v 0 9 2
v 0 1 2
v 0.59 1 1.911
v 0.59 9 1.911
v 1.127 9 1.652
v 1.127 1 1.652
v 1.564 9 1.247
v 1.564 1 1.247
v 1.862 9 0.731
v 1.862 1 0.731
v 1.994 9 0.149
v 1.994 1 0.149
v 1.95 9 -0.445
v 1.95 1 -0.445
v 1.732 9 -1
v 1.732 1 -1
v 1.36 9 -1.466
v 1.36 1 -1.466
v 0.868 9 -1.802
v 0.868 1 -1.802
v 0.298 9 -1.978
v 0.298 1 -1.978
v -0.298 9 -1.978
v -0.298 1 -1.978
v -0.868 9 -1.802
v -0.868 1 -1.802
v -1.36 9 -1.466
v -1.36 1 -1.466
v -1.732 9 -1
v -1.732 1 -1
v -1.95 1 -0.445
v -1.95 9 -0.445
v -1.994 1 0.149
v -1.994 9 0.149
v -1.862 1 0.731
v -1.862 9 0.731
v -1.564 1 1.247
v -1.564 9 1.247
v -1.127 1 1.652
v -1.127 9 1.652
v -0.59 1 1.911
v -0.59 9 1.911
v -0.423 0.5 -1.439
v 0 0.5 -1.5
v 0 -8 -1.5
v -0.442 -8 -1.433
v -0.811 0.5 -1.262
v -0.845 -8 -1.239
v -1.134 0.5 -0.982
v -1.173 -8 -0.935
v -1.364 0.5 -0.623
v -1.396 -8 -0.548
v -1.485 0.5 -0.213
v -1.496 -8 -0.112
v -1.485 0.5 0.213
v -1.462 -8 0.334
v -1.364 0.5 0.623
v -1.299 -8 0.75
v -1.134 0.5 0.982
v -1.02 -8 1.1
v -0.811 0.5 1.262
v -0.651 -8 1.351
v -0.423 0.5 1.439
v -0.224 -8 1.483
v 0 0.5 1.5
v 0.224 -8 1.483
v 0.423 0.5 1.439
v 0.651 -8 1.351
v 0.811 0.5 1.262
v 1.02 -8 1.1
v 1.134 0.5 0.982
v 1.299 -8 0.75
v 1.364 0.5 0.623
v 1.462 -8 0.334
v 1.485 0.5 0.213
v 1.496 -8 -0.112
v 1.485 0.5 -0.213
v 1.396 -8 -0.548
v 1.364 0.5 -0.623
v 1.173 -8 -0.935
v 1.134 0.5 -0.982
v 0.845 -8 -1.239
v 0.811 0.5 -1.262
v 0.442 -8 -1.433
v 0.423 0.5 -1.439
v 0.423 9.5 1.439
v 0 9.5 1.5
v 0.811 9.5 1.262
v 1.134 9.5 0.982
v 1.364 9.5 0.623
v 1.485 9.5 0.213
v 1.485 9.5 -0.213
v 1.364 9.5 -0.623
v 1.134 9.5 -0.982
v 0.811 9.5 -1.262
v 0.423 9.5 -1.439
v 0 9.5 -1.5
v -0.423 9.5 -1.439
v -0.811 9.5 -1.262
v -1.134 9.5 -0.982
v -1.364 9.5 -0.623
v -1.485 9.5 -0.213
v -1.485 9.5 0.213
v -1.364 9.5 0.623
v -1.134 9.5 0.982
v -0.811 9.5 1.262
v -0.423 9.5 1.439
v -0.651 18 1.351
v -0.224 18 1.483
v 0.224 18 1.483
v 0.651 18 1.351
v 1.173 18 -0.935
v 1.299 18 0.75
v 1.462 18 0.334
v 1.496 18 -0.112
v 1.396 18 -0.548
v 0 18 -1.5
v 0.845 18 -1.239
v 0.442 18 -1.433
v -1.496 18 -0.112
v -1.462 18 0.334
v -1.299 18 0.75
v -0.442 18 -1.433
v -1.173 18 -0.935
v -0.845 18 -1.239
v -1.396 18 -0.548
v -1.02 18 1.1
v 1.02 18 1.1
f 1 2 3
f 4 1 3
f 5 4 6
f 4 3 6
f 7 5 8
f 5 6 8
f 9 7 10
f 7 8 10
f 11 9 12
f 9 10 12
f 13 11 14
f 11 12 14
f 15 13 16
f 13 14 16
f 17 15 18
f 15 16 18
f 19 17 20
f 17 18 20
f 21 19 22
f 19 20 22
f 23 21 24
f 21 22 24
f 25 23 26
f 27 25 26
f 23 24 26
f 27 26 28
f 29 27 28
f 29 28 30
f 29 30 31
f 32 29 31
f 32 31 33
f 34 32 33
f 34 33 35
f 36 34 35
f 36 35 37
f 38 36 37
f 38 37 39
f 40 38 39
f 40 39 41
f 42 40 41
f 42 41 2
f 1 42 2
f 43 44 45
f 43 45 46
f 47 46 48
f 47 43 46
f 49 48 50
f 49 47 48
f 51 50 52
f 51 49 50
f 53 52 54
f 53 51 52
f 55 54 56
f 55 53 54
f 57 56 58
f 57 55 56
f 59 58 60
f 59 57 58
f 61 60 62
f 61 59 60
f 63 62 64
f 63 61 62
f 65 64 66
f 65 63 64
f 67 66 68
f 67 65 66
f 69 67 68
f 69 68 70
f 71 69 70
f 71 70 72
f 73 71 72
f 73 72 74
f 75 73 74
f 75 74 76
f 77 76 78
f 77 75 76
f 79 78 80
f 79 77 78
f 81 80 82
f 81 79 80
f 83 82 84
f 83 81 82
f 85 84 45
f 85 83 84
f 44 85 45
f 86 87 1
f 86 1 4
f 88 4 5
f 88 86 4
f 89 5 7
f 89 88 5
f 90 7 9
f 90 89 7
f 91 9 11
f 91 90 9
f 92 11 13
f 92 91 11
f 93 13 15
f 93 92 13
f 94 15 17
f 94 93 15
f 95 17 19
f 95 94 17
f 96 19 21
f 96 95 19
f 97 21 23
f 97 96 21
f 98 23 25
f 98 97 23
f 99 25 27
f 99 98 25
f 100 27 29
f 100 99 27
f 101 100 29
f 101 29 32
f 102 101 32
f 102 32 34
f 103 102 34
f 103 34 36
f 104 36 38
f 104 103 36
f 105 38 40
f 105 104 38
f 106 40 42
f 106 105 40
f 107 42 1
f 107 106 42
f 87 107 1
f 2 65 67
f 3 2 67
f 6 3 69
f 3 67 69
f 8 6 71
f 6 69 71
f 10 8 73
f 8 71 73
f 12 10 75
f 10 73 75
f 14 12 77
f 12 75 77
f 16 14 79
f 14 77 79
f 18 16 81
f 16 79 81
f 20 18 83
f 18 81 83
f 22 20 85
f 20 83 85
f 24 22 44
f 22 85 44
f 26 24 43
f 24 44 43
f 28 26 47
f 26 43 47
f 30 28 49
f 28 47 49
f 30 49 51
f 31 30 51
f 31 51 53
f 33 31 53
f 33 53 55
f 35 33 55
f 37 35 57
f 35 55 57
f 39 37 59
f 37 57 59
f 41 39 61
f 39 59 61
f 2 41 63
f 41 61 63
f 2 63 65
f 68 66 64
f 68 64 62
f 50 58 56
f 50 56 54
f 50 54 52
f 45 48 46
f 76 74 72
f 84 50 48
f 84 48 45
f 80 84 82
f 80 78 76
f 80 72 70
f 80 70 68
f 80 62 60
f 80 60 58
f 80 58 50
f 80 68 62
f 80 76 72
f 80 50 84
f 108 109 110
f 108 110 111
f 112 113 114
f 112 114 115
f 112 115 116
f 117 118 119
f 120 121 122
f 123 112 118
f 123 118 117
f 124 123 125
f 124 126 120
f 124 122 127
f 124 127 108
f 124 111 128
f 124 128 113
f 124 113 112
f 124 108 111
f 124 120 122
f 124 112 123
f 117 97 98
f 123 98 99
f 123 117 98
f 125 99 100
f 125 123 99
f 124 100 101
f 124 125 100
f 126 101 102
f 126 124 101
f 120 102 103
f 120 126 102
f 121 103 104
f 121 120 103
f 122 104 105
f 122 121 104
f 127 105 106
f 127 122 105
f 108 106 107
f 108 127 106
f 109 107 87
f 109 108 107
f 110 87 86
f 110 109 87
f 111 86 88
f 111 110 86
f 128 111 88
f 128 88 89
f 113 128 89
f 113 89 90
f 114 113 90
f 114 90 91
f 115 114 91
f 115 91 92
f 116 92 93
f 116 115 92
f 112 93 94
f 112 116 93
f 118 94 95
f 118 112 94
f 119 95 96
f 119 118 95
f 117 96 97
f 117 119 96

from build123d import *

# Parameters (mm, degrees)
SKETCH_1_R      = 2
EXTRUDE_1_DEPTH = 10
SKETCH_2_R      = 1.5
EXTRUDE_2_DEPTH = 8
EXTRUDE_START   = 8
SKETCH_3_R      = 1.5
EXTRUDE_3_DEPTH = 8
CHAMFER_1_SIZE  = 1


with BuildPart() as part:
    # 草图1 → 凸台-拉伸1 (new body)
    with BuildSketch(Plane(origin=(0, 0, 0), x_dir=(1, 0, 0), z_dir=(0, 1, 0))):
        with Locations(Location((0, 0, 0), (0, 0, 270))):
            Circle(SKETCH_1_R)
    extrude(amount=EXTRUDE_1_DEPTH)

    # 草图2 → 凸台-拉伸2 (add)
    with BuildSketch(Plane.XZ):
        with Locations(Location((0, 0, 0), (0, 0, 270))):
            Circle(SKETCH_2_R)
    extrude(amount=EXTRUDE_2_DEPTH)

    # 草图3 → 凸台-拉伸3 (add)
    with BuildSketch(Plane(origin=(0, 10, 0), x_dir=(1, 0, 0), z_dir=(0, 1, 0)).offset(EXTRUDE_START)):
        with Locations(Location((0, 0, 0), (0, 0, 90))):
            Circle(SKETCH_3_R)
    extrude(amount=-EXTRUDE_3_DEPTH)

    # 倒角1
    # the kernel refuses this chamfer: 1 mm, written as the material it takes off along each edge
    with BuildSketch(Plane(origin=(0, 0, 0), x_dir=(0, 0, 1), z_dir=(-1, 0, 0))) as chamfer_1_piece_1_section:
        Polygon((2, CHAMFER_1_SIZE), (2 - CHAMFER_1_SIZE, 0), (2, 0), align=None)
    chamfer_1_piece_1 = revolve(axis=Axis((0, 0, 0), (0, 1, 0)), mode=Mode.PRIVATE)
    chamfer_1_piece_1 = chamfer_1_piece_1 - Plane(origin=(0, 0.752378324, 0), x_dir=(0, 0, -1), z_dir=(0, 1, 0)) * Cylinder(1.5, 8, mode=Mode.PRIVATE)
    add(chamfer_1_piece_1, mode=Mode.SUBTRACT)
    with BuildSketch(Plane(origin=(0, 10, 0), x_dir=(0, 0, 1), z_dir=(-1, 0, 0))) as chamfer_1_piece_2_section:
        Polygon((2, -CHAMFER_1_SIZE), (2 - CHAMFER_1_SIZE, 0), (2, 0), align=None)
    chamfer_1_piece_2 = revolve(axis=Axis((0, 10, 0), (0, 1, 0)), mode=Mode.PRIVATE)
    chamfer_1_piece_2 = chamfer_1_piece_2 - Plane(origin=(0, 9.247621676, 0), x_dir=(0, 0, -1), z_dir=(0, 1, 0)) * Cylinder(1.5, 8, mode=Mode.PRIVATE)
    add(chamfer_1_piece_2, mode=Mode.SUBTRACT)


solid = part.part
